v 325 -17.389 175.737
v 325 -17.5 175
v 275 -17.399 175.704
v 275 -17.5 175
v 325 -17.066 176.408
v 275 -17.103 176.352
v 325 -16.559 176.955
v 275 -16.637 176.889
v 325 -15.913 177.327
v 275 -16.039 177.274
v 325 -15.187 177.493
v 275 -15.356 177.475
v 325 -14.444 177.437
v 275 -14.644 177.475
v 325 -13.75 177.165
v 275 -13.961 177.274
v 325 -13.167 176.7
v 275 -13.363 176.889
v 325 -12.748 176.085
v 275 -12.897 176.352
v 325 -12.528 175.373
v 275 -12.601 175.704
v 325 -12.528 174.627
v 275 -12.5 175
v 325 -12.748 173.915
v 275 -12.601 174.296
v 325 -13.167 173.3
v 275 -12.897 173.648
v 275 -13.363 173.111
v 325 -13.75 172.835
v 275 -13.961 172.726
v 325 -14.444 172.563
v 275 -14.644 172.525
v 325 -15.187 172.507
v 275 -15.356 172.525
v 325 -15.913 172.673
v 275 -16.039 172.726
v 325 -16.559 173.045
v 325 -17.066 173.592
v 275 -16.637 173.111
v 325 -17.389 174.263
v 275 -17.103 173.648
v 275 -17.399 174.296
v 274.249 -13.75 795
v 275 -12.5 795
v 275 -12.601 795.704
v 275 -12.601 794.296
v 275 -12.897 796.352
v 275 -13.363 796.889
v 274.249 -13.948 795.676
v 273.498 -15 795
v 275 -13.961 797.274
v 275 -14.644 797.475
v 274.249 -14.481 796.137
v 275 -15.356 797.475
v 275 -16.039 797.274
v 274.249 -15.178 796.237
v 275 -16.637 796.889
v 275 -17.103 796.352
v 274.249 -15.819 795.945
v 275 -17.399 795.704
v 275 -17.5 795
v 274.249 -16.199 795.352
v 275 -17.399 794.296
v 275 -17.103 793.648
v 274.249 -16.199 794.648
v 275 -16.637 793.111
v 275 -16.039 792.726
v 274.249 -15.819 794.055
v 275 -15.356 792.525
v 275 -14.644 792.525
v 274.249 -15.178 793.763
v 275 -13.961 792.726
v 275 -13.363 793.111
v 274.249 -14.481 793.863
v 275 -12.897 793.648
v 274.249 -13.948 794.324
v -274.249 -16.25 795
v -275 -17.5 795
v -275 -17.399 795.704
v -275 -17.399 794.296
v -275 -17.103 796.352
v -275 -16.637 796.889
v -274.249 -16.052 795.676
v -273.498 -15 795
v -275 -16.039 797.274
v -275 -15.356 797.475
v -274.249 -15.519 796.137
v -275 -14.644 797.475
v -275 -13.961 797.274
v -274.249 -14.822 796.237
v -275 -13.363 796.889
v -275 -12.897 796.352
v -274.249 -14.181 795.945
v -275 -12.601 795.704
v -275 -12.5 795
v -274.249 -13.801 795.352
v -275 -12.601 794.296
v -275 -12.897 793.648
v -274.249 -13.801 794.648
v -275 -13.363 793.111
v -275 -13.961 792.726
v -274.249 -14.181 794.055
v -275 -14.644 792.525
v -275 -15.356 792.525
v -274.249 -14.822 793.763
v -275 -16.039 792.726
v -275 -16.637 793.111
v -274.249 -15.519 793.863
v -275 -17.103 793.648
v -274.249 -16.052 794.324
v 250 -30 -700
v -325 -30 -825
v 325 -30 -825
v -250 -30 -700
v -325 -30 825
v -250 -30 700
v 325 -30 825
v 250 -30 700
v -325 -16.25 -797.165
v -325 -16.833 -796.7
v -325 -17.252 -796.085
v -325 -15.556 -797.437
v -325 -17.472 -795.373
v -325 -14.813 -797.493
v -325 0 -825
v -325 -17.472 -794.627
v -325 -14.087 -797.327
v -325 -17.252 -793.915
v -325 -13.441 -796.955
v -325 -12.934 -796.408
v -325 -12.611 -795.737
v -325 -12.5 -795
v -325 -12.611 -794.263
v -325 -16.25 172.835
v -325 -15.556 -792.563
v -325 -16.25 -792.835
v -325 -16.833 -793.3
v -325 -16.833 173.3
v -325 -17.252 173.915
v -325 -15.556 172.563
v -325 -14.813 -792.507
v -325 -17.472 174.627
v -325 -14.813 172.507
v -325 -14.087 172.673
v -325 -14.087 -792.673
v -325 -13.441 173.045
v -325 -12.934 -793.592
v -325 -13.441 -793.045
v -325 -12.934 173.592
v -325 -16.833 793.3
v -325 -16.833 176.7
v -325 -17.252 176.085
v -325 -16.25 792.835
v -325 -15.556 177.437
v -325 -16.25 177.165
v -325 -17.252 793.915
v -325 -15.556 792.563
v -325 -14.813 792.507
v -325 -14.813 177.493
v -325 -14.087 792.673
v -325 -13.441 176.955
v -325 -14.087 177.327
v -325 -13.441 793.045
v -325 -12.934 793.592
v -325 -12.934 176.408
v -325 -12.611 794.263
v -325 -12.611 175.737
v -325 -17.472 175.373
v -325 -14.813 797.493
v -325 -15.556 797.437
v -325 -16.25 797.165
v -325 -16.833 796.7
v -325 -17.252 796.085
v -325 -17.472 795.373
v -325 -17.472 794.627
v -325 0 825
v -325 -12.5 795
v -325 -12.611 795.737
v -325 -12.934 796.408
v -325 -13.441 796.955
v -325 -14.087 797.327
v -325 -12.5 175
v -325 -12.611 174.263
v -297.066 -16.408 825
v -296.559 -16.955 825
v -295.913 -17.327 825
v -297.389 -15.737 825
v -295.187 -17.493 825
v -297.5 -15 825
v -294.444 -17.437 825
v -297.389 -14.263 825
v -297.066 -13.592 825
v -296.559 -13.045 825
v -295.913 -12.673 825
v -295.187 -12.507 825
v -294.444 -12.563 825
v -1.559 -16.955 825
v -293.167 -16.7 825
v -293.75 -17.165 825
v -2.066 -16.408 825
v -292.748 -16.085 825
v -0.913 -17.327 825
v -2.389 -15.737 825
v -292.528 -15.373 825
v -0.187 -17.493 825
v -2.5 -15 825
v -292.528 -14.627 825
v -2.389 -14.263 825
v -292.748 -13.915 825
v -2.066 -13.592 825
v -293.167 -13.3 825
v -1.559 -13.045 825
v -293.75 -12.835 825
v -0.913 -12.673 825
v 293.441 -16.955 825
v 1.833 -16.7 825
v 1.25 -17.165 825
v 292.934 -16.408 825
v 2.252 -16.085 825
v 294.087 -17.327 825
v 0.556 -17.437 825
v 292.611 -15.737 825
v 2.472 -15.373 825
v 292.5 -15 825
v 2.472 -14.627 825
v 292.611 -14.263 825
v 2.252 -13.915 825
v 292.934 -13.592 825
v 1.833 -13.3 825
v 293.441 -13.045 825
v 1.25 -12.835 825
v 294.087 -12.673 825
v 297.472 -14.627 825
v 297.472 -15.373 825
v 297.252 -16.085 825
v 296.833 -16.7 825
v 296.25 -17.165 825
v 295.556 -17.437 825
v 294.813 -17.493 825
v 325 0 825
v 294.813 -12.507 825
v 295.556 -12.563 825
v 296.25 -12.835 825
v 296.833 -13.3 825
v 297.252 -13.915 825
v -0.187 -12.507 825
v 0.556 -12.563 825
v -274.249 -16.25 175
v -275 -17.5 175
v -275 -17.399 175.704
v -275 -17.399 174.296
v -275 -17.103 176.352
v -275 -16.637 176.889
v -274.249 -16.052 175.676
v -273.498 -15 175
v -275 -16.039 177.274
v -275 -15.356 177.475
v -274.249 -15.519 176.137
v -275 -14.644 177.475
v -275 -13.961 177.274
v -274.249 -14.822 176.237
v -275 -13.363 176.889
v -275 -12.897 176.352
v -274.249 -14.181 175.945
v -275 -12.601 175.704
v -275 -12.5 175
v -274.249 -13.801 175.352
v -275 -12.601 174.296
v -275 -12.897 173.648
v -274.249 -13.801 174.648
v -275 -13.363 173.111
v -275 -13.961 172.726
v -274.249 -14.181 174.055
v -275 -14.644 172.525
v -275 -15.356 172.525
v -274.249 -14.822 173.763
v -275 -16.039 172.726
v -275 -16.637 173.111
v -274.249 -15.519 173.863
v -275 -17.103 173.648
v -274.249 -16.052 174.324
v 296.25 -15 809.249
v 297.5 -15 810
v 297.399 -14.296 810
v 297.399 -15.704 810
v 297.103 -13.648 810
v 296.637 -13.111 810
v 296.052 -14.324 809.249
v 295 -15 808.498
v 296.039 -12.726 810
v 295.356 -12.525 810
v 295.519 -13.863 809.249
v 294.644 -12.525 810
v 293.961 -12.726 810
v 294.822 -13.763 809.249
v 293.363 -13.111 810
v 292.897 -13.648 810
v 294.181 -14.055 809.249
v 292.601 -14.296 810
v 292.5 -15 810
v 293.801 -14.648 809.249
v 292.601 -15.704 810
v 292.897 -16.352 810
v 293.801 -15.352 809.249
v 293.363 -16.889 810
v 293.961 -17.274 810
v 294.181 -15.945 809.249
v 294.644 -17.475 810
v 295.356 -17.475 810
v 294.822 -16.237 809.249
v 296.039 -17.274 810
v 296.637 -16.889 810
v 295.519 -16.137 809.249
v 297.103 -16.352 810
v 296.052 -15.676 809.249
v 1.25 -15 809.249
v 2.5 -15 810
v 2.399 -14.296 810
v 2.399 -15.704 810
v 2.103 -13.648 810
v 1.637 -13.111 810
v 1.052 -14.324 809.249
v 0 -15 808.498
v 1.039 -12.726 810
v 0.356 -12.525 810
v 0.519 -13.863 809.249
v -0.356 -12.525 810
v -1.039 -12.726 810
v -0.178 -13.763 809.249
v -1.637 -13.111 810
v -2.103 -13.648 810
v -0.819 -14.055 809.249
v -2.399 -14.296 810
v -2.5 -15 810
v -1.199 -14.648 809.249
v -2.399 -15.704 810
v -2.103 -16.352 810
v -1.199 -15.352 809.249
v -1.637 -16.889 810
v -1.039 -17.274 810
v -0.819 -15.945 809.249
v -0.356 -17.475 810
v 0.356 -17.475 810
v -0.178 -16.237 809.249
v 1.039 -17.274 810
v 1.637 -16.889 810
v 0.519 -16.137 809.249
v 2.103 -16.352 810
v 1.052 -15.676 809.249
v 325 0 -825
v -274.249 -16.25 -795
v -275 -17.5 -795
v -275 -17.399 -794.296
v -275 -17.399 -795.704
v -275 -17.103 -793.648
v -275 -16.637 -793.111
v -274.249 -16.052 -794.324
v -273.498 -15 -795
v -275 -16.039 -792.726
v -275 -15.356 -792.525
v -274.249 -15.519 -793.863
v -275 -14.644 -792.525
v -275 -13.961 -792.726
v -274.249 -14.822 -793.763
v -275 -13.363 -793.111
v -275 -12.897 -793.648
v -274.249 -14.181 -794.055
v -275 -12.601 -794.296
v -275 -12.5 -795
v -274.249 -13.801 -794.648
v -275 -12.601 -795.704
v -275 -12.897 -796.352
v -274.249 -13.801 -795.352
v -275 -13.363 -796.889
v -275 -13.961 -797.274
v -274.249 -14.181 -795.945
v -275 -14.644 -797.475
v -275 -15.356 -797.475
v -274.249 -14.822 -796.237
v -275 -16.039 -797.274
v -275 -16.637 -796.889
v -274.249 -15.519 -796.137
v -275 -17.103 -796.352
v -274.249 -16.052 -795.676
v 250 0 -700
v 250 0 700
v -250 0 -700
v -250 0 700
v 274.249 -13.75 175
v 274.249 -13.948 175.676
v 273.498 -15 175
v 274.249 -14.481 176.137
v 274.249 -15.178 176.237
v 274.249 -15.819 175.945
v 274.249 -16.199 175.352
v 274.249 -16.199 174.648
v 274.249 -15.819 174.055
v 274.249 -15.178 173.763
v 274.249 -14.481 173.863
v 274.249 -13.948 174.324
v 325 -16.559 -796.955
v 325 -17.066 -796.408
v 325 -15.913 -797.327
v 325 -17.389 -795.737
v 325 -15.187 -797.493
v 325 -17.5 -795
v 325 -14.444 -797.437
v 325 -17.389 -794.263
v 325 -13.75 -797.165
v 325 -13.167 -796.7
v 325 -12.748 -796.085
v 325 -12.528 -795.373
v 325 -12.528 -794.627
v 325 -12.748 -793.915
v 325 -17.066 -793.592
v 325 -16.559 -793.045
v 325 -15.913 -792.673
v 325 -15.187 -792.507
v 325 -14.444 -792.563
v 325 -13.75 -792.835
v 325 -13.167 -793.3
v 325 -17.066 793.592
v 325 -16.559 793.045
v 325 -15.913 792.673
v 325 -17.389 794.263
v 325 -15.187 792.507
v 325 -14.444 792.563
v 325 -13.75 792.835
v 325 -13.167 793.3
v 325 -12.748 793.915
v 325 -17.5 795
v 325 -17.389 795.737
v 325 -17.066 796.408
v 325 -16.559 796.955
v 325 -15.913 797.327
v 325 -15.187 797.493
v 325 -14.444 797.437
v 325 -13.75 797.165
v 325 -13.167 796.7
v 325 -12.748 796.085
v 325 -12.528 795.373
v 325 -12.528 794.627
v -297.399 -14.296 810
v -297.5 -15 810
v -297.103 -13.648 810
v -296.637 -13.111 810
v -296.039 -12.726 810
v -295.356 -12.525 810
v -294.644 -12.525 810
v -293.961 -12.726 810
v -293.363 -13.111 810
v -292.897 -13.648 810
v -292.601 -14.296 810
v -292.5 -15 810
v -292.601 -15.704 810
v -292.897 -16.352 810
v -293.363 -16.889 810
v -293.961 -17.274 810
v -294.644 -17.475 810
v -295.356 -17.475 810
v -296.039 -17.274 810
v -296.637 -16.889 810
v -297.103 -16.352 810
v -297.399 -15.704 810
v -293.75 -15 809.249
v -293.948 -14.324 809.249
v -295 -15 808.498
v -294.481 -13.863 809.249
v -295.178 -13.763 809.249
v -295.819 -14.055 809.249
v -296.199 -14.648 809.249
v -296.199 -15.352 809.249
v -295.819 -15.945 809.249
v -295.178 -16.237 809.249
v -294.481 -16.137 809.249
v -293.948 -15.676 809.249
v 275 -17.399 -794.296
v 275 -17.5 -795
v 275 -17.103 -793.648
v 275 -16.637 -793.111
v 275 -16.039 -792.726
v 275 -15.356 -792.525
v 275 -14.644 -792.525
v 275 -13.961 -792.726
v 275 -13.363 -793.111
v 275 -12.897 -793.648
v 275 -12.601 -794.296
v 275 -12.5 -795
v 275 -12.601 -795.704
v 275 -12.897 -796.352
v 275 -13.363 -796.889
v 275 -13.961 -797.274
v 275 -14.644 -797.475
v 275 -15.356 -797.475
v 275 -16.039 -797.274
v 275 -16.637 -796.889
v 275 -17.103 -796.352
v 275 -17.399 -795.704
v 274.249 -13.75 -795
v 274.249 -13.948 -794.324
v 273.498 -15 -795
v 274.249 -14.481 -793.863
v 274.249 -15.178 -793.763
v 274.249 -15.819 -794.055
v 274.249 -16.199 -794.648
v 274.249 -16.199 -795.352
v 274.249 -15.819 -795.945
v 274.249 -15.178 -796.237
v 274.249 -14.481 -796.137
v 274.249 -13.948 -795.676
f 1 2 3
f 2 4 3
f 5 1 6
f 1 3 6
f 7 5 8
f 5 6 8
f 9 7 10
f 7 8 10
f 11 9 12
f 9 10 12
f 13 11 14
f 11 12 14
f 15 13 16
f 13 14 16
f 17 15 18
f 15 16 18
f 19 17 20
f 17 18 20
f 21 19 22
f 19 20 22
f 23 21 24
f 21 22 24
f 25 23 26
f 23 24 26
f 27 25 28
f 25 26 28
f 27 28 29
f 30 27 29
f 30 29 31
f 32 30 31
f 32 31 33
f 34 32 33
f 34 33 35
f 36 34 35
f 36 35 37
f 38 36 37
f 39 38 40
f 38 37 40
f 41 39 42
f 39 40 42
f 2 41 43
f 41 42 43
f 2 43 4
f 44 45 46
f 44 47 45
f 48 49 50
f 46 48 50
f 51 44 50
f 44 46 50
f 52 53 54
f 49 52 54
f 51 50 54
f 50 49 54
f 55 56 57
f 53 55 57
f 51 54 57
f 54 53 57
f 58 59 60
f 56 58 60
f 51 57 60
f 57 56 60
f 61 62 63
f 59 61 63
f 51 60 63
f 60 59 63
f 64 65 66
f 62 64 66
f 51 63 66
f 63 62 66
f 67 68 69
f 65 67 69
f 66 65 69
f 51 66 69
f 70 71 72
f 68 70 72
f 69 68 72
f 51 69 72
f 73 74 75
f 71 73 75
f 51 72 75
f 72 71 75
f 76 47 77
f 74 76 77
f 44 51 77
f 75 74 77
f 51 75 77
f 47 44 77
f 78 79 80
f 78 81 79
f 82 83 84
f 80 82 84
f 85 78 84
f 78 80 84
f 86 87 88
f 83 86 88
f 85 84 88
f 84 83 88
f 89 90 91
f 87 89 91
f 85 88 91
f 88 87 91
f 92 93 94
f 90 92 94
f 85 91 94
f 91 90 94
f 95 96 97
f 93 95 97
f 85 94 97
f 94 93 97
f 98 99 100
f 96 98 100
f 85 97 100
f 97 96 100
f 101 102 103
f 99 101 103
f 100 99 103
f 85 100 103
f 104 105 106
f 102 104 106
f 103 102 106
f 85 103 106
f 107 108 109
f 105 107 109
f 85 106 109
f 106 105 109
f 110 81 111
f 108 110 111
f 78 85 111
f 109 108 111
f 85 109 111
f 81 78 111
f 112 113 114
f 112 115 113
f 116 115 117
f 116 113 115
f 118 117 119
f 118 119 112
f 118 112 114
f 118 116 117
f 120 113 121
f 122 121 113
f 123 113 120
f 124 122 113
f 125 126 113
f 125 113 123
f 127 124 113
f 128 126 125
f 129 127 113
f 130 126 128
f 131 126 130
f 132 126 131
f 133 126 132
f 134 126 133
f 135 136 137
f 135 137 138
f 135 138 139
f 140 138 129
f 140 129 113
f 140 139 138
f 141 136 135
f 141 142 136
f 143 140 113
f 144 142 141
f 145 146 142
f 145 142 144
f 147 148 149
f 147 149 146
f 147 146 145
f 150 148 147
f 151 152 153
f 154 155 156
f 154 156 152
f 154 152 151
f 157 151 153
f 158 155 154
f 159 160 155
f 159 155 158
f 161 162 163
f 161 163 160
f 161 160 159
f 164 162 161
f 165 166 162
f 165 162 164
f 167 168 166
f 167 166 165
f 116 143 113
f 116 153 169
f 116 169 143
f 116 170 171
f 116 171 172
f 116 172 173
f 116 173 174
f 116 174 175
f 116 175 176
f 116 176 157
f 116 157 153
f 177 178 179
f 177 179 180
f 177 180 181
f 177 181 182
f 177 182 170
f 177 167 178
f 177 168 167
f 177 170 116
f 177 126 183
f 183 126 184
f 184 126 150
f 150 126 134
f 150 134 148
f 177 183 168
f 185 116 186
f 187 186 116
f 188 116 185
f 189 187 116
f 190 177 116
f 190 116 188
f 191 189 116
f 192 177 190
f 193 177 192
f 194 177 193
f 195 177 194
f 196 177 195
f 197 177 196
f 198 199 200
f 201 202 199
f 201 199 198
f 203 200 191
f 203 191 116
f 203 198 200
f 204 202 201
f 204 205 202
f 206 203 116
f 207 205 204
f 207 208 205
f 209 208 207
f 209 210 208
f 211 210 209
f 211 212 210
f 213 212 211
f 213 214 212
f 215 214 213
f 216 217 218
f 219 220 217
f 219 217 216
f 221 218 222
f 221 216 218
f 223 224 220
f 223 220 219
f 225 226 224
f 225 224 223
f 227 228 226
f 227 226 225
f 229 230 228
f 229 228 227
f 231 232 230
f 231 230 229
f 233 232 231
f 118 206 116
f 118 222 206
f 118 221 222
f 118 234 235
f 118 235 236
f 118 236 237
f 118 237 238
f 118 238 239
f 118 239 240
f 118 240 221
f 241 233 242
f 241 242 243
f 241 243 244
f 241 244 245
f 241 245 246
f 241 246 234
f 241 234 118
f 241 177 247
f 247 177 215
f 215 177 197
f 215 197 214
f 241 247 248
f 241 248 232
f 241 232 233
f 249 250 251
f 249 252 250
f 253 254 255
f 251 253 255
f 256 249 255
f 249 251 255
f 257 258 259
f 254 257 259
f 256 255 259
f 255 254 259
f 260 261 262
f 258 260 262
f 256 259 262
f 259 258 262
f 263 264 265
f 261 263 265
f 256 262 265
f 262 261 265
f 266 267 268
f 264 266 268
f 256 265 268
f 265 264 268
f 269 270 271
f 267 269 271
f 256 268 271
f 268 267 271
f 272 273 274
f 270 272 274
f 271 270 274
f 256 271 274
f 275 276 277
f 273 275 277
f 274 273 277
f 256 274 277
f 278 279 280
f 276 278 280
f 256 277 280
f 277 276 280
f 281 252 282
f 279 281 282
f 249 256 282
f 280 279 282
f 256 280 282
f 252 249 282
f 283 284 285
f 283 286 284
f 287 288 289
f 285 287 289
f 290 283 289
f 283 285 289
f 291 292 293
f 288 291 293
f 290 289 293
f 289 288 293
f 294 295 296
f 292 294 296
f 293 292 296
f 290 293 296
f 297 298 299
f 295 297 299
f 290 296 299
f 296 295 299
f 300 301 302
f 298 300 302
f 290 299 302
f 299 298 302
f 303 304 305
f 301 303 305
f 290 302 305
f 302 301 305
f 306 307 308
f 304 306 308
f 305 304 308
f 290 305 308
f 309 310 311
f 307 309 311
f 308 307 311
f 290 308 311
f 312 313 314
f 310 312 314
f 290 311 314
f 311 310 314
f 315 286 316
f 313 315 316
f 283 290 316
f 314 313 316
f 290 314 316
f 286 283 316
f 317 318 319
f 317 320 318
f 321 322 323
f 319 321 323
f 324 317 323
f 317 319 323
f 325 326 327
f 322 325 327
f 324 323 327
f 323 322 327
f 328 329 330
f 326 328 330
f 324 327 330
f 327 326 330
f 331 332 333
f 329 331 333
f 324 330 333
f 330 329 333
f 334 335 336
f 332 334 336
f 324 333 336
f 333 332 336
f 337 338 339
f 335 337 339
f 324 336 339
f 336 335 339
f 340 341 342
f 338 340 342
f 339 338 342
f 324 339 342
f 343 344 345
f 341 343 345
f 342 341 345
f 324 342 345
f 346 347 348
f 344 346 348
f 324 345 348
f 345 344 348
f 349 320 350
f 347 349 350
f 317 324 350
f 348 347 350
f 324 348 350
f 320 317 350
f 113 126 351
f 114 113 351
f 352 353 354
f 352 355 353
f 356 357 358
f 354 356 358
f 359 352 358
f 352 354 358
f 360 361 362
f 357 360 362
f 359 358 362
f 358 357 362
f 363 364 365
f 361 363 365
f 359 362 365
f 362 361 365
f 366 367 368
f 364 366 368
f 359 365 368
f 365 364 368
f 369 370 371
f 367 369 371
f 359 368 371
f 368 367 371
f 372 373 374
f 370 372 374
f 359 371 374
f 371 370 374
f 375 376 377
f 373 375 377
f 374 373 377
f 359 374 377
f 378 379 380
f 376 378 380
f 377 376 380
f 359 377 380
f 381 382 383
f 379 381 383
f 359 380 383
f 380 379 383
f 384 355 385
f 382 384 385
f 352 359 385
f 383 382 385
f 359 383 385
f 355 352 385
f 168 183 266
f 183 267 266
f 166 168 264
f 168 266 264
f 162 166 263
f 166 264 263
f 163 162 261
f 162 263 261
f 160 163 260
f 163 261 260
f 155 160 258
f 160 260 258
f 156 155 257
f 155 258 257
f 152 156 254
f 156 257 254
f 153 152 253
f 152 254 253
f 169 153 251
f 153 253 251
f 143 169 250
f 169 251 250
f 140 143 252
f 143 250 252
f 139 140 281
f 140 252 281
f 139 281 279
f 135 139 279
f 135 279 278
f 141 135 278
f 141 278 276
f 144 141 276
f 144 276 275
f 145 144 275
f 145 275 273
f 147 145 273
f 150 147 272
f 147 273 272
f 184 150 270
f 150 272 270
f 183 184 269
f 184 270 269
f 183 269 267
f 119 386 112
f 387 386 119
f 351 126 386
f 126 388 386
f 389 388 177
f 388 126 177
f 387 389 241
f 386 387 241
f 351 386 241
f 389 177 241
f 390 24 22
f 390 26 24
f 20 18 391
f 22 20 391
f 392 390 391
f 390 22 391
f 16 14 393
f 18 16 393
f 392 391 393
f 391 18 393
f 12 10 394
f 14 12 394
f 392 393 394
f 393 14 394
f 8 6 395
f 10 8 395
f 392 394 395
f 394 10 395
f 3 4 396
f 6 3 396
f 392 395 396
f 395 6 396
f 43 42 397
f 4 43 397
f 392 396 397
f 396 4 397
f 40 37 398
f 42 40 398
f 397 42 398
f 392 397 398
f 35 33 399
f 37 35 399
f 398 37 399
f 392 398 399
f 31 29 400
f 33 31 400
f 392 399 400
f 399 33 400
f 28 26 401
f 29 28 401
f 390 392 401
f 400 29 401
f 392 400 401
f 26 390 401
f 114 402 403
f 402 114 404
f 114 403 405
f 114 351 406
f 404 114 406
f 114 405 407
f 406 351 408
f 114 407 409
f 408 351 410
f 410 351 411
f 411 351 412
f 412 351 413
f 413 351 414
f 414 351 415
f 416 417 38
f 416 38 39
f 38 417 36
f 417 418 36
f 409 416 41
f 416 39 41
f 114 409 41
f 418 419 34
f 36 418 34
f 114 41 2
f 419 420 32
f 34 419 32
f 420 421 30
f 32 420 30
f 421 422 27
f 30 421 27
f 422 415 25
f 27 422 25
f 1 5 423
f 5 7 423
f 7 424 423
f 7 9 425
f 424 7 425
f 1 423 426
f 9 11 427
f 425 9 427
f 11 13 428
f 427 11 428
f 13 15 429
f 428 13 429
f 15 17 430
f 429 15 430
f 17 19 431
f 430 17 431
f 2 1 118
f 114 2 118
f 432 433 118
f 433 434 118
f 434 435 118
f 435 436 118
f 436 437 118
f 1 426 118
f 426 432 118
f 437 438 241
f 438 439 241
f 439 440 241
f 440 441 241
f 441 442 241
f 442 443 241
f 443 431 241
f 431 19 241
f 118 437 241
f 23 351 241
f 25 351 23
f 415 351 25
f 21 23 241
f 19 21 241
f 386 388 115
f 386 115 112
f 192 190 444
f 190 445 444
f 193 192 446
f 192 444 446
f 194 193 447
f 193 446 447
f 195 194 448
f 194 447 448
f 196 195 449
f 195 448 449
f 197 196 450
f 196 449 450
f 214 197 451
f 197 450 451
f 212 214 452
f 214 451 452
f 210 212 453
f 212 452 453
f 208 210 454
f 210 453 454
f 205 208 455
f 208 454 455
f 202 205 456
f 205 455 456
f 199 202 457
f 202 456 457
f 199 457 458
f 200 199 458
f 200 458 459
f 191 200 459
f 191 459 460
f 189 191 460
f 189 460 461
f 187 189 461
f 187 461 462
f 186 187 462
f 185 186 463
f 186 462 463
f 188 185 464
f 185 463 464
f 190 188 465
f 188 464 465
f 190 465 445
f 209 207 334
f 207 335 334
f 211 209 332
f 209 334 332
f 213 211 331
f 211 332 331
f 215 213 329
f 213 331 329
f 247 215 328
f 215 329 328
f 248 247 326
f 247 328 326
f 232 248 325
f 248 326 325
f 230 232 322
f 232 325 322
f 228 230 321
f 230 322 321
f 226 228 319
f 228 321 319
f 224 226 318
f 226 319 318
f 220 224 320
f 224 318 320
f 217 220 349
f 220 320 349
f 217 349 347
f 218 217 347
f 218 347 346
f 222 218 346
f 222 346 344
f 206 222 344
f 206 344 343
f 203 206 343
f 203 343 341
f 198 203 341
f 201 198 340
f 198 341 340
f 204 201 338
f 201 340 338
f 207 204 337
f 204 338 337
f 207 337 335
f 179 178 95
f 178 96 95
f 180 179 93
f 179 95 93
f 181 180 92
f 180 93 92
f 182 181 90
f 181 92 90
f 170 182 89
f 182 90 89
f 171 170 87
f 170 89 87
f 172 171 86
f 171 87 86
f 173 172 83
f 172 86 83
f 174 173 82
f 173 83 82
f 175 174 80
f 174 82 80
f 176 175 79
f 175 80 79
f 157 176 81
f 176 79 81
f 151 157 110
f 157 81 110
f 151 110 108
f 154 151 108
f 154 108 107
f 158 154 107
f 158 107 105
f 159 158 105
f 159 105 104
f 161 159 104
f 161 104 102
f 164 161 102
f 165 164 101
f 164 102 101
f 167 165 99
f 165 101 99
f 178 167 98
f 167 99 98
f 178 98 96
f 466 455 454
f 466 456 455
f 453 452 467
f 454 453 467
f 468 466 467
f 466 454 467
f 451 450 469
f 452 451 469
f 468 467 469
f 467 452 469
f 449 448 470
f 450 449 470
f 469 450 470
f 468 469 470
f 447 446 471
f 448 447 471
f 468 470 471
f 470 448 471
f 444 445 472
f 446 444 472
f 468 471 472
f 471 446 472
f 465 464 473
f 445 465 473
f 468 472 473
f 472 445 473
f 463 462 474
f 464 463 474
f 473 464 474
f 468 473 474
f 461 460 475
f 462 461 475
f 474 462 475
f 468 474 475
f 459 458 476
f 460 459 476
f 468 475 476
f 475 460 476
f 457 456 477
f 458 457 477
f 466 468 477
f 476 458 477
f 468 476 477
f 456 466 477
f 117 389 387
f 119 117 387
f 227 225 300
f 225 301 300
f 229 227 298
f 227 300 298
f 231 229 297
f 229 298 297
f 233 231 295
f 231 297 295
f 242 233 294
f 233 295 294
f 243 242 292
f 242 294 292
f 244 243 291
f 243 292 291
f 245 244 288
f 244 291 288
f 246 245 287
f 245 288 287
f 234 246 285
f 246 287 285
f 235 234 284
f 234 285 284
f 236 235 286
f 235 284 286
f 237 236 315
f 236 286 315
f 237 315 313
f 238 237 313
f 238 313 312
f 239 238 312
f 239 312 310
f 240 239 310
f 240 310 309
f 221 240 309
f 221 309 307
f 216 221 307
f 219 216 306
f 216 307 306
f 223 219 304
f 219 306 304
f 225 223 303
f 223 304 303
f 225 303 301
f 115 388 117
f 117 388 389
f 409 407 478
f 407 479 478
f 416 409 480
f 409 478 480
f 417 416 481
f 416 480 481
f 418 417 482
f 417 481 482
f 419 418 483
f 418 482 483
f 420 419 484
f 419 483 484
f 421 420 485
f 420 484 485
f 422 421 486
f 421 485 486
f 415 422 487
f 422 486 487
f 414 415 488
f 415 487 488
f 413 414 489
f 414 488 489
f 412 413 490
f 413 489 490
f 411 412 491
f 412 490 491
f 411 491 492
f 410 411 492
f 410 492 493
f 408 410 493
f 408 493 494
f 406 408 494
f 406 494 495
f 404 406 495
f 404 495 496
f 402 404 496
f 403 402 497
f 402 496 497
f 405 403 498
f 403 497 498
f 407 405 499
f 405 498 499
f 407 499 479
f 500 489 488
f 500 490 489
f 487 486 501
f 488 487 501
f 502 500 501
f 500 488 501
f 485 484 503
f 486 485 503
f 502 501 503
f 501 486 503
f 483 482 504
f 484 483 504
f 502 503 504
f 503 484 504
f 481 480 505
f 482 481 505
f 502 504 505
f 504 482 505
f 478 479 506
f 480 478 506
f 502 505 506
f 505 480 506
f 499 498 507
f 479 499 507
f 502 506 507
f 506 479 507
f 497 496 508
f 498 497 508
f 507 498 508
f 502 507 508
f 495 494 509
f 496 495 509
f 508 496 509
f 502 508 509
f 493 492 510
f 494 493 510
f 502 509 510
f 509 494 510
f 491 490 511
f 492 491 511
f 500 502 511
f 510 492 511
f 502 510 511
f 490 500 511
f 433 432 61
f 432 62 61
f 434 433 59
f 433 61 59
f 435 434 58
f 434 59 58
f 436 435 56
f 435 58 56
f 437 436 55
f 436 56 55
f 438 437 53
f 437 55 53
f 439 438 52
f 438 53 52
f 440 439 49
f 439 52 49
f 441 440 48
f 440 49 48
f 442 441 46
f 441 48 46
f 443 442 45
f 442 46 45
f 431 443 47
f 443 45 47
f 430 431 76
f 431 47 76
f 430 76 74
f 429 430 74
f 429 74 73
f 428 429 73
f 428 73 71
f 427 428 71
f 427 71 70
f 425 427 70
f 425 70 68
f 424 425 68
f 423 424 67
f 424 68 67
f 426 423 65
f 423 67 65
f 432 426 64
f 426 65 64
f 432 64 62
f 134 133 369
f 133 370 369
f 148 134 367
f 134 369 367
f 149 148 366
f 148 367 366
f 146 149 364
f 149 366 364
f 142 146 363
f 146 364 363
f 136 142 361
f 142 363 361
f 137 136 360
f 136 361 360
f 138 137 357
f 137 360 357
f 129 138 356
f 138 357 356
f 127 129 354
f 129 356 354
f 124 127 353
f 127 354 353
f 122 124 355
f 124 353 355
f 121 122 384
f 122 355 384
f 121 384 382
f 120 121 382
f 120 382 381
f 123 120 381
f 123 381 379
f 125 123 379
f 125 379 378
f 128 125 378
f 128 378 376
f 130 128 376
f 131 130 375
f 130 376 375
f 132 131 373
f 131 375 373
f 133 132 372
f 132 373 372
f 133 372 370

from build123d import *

# Parameters (mm, degrees)
F0_W      = 650
F0_H      = 1650
F0_W_2    = 500
F0_H_2    = 1400
F1_DEPTH  = 30
F5_D      = 5
F5_DEPTH  = 50
F5_TIP    = 1.5021515476
F7_D      = 5
F7_DEPTH  = 50
F7_TIP    = 1.5021515476
F10_D     = 5
F10_DEPTH = 15
F10_TIP   = 1.5021515476


with BuildPart() as f1:
    # F0 (on Front) → F1 (new body)
    with BuildSketch(Plane.XZ):
        Rectangle(F0_W, F0_H)
        Rectangle(F0_W_2, F0_H_2, mode=Mode.SUBTRACT)
    extrude(amount=F1_DEPTH)

    # F5
    with Locations(Plane(origin=(-325, 0, 0), x_dir=(0, -1, 0), z_dir=(-1, 0, 0))):
        with Locations((15, 795.0000119209), (15, 175.0000119209), (15, -794.9999880791)):
            Hole(F5_D / 2, depth=F5_DEPTH)
            with Locations((0, 0, -(F5_DEPTH + F5_TIP / 2))):  # 118° drill point
                Cone(0, F5_D / 2, F5_TIP, mode=Mode.SUBTRACT)

    # F7
    with Locations(Plane.YZ.offset(325)):
        with Locations((-14.9999763817, 795.000018446), (-14.9999763817, 175.000018446), (-14.9999763817, -794.999981554)):
            Hole(F7_D / 2, depth=F7_DEPTH)
            with Locations((0, 0, -(F7_DEPTH + F7_TIP / 2))):  # 118° drill point
                Cone(0, F7_D / 2, F7_TIP, mode=Mode.SUBTRACT)

    # F10
    with Locations(Plane.XY.offset(825)):
        with Locations((-295, -14.9999856949), (0, -15), (295, -15)):
            Hole(F10_D / 2, depth=F10_DEPTH)
            with Locations((0, 0, -(F10_DEPTH + F10_TIP / 2))):  # 118° drill point
                Cone(0, F10_D / 2, F10_TIP, mode=Mode.SUBTRACT)


solid = f1.part
